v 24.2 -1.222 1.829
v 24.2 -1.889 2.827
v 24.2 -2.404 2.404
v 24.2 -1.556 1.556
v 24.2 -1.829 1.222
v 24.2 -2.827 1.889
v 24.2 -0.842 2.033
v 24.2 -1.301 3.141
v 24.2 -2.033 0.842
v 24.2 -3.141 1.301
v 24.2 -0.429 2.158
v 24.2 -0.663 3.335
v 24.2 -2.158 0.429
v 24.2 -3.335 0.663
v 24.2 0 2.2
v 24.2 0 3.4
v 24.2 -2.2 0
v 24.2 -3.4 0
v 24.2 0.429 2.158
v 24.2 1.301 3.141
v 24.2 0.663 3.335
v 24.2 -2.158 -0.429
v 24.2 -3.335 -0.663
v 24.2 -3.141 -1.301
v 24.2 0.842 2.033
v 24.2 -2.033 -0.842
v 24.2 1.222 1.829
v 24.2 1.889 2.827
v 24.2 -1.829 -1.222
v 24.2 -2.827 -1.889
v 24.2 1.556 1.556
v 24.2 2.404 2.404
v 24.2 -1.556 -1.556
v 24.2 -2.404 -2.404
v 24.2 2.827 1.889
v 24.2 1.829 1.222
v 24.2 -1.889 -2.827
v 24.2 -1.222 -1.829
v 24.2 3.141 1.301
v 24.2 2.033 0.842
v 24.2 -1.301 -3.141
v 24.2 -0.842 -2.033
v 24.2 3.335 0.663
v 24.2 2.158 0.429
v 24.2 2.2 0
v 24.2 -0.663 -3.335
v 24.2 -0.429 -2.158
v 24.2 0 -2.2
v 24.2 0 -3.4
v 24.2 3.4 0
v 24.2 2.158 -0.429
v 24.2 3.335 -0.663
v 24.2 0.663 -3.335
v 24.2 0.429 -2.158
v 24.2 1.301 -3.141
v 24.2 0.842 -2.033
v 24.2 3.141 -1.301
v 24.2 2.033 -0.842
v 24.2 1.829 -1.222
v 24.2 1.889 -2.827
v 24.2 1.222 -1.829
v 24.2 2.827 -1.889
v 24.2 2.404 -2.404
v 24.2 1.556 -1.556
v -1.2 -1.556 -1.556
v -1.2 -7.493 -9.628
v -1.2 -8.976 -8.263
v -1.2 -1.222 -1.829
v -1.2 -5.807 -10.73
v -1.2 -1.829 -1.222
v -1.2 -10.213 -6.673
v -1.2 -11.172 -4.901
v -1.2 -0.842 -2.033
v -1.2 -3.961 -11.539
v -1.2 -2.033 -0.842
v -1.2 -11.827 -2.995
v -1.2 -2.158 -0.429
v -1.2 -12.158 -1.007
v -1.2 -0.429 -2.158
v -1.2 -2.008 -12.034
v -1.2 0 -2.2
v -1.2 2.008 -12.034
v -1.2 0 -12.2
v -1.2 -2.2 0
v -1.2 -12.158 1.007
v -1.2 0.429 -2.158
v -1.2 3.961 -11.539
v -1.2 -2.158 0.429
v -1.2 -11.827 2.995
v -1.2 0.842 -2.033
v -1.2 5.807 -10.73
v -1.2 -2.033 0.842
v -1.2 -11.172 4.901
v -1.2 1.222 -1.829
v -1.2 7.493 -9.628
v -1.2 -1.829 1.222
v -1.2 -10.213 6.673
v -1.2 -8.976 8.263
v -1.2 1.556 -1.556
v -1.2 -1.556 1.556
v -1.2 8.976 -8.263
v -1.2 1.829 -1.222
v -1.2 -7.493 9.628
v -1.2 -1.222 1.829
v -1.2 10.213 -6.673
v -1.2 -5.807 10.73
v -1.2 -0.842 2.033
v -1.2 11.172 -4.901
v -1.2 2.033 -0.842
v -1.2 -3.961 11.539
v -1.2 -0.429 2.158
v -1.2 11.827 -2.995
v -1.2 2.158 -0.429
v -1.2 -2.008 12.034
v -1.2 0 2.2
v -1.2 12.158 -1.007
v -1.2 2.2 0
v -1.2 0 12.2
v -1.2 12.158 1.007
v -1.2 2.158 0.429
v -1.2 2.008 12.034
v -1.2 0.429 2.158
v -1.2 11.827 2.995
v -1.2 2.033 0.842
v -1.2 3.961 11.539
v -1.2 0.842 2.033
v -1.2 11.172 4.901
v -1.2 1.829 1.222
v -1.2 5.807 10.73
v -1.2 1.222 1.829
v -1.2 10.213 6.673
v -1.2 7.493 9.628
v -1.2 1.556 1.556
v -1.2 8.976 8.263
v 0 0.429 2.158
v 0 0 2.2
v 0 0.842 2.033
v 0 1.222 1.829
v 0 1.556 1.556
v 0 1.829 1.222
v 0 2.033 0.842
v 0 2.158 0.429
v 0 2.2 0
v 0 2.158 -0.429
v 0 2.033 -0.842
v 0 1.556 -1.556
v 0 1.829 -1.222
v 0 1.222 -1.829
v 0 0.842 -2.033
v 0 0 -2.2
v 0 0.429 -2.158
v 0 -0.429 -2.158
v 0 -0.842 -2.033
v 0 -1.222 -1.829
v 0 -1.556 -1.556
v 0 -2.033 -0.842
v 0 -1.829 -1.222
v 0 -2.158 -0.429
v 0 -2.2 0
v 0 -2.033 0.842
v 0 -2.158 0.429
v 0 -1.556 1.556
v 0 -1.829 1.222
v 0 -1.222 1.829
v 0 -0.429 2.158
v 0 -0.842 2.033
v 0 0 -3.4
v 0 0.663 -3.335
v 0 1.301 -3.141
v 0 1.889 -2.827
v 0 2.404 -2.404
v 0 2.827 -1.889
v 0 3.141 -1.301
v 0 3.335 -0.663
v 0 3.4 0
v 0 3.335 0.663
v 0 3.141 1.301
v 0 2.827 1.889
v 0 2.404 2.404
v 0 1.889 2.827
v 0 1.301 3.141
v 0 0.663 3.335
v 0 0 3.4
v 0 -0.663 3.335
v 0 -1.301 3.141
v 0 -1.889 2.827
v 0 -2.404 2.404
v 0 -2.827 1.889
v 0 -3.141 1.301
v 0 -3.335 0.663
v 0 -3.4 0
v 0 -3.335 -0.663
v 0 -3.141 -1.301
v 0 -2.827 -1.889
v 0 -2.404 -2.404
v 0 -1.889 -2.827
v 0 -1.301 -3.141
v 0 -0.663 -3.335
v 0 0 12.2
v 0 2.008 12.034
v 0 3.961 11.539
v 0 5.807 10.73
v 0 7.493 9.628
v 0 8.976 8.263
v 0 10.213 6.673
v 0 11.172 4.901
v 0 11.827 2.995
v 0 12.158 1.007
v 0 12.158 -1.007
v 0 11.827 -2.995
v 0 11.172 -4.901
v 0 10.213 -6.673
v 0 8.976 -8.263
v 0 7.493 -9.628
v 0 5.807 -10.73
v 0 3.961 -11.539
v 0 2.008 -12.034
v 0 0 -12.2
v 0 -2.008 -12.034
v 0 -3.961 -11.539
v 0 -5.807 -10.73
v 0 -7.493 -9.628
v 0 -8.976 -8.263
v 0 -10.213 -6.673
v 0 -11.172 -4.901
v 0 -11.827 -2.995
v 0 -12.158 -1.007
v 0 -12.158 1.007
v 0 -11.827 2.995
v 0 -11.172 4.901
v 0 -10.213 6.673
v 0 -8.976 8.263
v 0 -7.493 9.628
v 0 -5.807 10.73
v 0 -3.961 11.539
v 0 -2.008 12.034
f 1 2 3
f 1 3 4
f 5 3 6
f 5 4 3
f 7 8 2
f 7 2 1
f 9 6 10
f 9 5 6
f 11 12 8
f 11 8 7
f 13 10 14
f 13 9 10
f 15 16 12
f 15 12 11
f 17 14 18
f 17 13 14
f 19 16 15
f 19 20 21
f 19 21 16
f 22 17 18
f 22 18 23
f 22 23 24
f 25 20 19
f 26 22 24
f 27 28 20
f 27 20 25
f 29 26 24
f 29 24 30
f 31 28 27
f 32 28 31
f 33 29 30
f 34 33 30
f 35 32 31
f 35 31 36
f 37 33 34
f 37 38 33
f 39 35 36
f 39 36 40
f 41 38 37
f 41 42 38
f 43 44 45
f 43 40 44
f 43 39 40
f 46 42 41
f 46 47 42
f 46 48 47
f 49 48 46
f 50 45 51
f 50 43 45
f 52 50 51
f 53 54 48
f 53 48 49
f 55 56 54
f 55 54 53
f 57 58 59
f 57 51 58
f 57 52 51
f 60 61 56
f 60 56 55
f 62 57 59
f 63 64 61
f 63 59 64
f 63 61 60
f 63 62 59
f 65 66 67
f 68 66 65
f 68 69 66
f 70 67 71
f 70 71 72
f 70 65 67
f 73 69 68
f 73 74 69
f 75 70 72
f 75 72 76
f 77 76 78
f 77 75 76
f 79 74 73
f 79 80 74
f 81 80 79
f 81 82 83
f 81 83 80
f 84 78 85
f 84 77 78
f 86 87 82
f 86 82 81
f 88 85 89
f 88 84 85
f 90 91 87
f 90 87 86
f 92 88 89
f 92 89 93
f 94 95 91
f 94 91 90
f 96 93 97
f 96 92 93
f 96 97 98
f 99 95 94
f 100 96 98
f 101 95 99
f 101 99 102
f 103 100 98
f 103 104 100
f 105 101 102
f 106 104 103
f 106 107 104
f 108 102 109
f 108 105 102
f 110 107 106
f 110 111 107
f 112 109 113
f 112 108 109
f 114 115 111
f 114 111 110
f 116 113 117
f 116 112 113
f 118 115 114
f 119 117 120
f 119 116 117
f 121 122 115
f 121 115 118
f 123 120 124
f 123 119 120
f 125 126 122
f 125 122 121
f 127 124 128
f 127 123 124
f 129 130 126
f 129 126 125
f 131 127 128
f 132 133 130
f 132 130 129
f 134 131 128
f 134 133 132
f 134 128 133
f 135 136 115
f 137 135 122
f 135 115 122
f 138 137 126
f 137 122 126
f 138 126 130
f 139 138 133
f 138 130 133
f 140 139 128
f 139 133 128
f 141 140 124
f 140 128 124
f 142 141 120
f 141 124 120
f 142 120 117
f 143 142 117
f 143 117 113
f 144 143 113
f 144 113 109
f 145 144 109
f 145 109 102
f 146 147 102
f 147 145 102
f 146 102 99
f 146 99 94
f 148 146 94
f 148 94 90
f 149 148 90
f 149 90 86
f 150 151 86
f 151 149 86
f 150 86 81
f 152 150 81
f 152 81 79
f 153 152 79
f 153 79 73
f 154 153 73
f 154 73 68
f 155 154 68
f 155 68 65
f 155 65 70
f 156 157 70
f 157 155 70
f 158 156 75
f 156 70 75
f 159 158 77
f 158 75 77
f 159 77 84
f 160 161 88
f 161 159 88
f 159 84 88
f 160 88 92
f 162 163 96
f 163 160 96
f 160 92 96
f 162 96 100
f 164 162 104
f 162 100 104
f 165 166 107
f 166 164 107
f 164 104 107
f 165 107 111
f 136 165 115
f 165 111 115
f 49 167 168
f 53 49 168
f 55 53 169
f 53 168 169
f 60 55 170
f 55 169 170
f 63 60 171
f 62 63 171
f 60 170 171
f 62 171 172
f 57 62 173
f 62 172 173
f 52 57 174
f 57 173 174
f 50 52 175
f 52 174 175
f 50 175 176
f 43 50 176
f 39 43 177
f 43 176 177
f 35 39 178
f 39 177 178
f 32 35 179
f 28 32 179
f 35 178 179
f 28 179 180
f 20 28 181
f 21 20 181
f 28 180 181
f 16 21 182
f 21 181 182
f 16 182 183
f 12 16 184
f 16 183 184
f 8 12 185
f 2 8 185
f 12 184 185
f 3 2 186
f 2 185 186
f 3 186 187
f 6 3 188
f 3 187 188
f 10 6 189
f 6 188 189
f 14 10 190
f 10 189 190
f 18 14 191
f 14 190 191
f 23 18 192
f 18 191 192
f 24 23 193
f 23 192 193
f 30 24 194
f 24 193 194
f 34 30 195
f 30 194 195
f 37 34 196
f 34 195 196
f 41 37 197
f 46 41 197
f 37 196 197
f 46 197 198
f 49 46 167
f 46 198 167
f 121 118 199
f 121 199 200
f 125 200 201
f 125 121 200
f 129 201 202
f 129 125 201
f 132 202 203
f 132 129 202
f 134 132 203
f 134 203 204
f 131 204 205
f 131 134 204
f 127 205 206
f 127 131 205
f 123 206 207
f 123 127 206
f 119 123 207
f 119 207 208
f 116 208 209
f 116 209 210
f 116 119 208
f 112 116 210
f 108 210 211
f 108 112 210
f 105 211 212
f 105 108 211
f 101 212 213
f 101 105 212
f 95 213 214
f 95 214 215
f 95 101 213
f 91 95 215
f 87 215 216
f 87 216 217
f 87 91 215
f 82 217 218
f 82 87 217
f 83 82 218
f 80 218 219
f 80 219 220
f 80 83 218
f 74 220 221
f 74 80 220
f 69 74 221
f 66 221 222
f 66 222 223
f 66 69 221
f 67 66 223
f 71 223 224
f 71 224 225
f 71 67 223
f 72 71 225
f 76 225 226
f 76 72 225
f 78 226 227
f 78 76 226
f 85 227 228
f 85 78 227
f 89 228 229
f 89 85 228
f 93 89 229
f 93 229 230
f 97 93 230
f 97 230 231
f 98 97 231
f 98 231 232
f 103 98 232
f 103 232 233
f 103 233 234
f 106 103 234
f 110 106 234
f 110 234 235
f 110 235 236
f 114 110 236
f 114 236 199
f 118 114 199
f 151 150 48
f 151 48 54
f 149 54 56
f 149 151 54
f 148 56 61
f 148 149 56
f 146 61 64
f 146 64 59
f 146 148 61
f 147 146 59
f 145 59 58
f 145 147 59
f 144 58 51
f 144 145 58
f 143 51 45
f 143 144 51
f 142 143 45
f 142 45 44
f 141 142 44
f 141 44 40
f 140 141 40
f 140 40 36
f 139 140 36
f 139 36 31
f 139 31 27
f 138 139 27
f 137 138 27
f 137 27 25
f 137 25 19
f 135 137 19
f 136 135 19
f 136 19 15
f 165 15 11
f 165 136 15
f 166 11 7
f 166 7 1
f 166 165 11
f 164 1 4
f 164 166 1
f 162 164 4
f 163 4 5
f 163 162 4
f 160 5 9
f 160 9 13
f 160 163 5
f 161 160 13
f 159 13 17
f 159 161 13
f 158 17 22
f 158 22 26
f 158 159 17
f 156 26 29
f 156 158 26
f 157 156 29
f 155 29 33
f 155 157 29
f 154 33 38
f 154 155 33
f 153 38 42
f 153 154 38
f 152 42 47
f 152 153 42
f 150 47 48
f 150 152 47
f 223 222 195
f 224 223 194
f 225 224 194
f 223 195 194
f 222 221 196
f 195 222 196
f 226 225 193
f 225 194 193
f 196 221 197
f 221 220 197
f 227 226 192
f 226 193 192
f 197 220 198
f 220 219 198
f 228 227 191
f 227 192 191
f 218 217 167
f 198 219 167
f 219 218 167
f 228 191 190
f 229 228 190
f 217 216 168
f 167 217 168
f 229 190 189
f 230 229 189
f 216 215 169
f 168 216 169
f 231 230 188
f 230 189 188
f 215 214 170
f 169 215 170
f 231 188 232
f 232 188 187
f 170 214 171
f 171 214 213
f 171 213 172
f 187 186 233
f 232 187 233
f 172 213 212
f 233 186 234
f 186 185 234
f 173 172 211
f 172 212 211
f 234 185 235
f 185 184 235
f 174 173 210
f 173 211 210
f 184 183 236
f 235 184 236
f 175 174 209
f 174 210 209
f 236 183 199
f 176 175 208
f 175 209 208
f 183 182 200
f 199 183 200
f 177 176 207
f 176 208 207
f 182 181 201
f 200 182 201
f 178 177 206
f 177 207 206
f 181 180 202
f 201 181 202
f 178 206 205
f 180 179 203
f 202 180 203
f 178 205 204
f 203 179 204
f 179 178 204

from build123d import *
from build123d.topology import SkipClean

# Parameters (mm, degrees)
SKETCH1_R           = 3.4
SKETCH1_R_2         = 2.2
BOSS_EXTRUDE1_DEPTH = 24.2
BOSS_EXTRUDE2_START = 1.2
SKETCH3_R           = 12.2
SKETCH3_R_2         = 2.2
BOSS_EXTRUDE2_DEPTH = 1.2


with BuildPart() as part:
    # Sketch1 → Boss-Extrude1 (new body)
    with BuildSketch(Plane(origin=(0, 0, 0), x_dir=(0, 0, -1), z_dir=(1, 0, 0))):
        Circle(SKETCH1_R)
        Circle(SKETCH1_R_2, mode=Mode.SUBTRACT)
    extrude(amount=BOSS_EXTRUDE1_DEPTH)

    # Sketch3 → Boss-Extrude2 (add)
    with SkipClean():  # the faces are left unmerged after this step: merging them gives an invalid solid
        with BuildSketch(Plane.ZY.offset(BOSS_EXTRUDE2_START)):
            Circle(SKETCH3_R)
            Circle(SKETCH3_R_2, mode=Mode.SUBTRACT)
        extrude(amount=-BOSS_EXTRUDE2_DEPTH)


solid = part.part
